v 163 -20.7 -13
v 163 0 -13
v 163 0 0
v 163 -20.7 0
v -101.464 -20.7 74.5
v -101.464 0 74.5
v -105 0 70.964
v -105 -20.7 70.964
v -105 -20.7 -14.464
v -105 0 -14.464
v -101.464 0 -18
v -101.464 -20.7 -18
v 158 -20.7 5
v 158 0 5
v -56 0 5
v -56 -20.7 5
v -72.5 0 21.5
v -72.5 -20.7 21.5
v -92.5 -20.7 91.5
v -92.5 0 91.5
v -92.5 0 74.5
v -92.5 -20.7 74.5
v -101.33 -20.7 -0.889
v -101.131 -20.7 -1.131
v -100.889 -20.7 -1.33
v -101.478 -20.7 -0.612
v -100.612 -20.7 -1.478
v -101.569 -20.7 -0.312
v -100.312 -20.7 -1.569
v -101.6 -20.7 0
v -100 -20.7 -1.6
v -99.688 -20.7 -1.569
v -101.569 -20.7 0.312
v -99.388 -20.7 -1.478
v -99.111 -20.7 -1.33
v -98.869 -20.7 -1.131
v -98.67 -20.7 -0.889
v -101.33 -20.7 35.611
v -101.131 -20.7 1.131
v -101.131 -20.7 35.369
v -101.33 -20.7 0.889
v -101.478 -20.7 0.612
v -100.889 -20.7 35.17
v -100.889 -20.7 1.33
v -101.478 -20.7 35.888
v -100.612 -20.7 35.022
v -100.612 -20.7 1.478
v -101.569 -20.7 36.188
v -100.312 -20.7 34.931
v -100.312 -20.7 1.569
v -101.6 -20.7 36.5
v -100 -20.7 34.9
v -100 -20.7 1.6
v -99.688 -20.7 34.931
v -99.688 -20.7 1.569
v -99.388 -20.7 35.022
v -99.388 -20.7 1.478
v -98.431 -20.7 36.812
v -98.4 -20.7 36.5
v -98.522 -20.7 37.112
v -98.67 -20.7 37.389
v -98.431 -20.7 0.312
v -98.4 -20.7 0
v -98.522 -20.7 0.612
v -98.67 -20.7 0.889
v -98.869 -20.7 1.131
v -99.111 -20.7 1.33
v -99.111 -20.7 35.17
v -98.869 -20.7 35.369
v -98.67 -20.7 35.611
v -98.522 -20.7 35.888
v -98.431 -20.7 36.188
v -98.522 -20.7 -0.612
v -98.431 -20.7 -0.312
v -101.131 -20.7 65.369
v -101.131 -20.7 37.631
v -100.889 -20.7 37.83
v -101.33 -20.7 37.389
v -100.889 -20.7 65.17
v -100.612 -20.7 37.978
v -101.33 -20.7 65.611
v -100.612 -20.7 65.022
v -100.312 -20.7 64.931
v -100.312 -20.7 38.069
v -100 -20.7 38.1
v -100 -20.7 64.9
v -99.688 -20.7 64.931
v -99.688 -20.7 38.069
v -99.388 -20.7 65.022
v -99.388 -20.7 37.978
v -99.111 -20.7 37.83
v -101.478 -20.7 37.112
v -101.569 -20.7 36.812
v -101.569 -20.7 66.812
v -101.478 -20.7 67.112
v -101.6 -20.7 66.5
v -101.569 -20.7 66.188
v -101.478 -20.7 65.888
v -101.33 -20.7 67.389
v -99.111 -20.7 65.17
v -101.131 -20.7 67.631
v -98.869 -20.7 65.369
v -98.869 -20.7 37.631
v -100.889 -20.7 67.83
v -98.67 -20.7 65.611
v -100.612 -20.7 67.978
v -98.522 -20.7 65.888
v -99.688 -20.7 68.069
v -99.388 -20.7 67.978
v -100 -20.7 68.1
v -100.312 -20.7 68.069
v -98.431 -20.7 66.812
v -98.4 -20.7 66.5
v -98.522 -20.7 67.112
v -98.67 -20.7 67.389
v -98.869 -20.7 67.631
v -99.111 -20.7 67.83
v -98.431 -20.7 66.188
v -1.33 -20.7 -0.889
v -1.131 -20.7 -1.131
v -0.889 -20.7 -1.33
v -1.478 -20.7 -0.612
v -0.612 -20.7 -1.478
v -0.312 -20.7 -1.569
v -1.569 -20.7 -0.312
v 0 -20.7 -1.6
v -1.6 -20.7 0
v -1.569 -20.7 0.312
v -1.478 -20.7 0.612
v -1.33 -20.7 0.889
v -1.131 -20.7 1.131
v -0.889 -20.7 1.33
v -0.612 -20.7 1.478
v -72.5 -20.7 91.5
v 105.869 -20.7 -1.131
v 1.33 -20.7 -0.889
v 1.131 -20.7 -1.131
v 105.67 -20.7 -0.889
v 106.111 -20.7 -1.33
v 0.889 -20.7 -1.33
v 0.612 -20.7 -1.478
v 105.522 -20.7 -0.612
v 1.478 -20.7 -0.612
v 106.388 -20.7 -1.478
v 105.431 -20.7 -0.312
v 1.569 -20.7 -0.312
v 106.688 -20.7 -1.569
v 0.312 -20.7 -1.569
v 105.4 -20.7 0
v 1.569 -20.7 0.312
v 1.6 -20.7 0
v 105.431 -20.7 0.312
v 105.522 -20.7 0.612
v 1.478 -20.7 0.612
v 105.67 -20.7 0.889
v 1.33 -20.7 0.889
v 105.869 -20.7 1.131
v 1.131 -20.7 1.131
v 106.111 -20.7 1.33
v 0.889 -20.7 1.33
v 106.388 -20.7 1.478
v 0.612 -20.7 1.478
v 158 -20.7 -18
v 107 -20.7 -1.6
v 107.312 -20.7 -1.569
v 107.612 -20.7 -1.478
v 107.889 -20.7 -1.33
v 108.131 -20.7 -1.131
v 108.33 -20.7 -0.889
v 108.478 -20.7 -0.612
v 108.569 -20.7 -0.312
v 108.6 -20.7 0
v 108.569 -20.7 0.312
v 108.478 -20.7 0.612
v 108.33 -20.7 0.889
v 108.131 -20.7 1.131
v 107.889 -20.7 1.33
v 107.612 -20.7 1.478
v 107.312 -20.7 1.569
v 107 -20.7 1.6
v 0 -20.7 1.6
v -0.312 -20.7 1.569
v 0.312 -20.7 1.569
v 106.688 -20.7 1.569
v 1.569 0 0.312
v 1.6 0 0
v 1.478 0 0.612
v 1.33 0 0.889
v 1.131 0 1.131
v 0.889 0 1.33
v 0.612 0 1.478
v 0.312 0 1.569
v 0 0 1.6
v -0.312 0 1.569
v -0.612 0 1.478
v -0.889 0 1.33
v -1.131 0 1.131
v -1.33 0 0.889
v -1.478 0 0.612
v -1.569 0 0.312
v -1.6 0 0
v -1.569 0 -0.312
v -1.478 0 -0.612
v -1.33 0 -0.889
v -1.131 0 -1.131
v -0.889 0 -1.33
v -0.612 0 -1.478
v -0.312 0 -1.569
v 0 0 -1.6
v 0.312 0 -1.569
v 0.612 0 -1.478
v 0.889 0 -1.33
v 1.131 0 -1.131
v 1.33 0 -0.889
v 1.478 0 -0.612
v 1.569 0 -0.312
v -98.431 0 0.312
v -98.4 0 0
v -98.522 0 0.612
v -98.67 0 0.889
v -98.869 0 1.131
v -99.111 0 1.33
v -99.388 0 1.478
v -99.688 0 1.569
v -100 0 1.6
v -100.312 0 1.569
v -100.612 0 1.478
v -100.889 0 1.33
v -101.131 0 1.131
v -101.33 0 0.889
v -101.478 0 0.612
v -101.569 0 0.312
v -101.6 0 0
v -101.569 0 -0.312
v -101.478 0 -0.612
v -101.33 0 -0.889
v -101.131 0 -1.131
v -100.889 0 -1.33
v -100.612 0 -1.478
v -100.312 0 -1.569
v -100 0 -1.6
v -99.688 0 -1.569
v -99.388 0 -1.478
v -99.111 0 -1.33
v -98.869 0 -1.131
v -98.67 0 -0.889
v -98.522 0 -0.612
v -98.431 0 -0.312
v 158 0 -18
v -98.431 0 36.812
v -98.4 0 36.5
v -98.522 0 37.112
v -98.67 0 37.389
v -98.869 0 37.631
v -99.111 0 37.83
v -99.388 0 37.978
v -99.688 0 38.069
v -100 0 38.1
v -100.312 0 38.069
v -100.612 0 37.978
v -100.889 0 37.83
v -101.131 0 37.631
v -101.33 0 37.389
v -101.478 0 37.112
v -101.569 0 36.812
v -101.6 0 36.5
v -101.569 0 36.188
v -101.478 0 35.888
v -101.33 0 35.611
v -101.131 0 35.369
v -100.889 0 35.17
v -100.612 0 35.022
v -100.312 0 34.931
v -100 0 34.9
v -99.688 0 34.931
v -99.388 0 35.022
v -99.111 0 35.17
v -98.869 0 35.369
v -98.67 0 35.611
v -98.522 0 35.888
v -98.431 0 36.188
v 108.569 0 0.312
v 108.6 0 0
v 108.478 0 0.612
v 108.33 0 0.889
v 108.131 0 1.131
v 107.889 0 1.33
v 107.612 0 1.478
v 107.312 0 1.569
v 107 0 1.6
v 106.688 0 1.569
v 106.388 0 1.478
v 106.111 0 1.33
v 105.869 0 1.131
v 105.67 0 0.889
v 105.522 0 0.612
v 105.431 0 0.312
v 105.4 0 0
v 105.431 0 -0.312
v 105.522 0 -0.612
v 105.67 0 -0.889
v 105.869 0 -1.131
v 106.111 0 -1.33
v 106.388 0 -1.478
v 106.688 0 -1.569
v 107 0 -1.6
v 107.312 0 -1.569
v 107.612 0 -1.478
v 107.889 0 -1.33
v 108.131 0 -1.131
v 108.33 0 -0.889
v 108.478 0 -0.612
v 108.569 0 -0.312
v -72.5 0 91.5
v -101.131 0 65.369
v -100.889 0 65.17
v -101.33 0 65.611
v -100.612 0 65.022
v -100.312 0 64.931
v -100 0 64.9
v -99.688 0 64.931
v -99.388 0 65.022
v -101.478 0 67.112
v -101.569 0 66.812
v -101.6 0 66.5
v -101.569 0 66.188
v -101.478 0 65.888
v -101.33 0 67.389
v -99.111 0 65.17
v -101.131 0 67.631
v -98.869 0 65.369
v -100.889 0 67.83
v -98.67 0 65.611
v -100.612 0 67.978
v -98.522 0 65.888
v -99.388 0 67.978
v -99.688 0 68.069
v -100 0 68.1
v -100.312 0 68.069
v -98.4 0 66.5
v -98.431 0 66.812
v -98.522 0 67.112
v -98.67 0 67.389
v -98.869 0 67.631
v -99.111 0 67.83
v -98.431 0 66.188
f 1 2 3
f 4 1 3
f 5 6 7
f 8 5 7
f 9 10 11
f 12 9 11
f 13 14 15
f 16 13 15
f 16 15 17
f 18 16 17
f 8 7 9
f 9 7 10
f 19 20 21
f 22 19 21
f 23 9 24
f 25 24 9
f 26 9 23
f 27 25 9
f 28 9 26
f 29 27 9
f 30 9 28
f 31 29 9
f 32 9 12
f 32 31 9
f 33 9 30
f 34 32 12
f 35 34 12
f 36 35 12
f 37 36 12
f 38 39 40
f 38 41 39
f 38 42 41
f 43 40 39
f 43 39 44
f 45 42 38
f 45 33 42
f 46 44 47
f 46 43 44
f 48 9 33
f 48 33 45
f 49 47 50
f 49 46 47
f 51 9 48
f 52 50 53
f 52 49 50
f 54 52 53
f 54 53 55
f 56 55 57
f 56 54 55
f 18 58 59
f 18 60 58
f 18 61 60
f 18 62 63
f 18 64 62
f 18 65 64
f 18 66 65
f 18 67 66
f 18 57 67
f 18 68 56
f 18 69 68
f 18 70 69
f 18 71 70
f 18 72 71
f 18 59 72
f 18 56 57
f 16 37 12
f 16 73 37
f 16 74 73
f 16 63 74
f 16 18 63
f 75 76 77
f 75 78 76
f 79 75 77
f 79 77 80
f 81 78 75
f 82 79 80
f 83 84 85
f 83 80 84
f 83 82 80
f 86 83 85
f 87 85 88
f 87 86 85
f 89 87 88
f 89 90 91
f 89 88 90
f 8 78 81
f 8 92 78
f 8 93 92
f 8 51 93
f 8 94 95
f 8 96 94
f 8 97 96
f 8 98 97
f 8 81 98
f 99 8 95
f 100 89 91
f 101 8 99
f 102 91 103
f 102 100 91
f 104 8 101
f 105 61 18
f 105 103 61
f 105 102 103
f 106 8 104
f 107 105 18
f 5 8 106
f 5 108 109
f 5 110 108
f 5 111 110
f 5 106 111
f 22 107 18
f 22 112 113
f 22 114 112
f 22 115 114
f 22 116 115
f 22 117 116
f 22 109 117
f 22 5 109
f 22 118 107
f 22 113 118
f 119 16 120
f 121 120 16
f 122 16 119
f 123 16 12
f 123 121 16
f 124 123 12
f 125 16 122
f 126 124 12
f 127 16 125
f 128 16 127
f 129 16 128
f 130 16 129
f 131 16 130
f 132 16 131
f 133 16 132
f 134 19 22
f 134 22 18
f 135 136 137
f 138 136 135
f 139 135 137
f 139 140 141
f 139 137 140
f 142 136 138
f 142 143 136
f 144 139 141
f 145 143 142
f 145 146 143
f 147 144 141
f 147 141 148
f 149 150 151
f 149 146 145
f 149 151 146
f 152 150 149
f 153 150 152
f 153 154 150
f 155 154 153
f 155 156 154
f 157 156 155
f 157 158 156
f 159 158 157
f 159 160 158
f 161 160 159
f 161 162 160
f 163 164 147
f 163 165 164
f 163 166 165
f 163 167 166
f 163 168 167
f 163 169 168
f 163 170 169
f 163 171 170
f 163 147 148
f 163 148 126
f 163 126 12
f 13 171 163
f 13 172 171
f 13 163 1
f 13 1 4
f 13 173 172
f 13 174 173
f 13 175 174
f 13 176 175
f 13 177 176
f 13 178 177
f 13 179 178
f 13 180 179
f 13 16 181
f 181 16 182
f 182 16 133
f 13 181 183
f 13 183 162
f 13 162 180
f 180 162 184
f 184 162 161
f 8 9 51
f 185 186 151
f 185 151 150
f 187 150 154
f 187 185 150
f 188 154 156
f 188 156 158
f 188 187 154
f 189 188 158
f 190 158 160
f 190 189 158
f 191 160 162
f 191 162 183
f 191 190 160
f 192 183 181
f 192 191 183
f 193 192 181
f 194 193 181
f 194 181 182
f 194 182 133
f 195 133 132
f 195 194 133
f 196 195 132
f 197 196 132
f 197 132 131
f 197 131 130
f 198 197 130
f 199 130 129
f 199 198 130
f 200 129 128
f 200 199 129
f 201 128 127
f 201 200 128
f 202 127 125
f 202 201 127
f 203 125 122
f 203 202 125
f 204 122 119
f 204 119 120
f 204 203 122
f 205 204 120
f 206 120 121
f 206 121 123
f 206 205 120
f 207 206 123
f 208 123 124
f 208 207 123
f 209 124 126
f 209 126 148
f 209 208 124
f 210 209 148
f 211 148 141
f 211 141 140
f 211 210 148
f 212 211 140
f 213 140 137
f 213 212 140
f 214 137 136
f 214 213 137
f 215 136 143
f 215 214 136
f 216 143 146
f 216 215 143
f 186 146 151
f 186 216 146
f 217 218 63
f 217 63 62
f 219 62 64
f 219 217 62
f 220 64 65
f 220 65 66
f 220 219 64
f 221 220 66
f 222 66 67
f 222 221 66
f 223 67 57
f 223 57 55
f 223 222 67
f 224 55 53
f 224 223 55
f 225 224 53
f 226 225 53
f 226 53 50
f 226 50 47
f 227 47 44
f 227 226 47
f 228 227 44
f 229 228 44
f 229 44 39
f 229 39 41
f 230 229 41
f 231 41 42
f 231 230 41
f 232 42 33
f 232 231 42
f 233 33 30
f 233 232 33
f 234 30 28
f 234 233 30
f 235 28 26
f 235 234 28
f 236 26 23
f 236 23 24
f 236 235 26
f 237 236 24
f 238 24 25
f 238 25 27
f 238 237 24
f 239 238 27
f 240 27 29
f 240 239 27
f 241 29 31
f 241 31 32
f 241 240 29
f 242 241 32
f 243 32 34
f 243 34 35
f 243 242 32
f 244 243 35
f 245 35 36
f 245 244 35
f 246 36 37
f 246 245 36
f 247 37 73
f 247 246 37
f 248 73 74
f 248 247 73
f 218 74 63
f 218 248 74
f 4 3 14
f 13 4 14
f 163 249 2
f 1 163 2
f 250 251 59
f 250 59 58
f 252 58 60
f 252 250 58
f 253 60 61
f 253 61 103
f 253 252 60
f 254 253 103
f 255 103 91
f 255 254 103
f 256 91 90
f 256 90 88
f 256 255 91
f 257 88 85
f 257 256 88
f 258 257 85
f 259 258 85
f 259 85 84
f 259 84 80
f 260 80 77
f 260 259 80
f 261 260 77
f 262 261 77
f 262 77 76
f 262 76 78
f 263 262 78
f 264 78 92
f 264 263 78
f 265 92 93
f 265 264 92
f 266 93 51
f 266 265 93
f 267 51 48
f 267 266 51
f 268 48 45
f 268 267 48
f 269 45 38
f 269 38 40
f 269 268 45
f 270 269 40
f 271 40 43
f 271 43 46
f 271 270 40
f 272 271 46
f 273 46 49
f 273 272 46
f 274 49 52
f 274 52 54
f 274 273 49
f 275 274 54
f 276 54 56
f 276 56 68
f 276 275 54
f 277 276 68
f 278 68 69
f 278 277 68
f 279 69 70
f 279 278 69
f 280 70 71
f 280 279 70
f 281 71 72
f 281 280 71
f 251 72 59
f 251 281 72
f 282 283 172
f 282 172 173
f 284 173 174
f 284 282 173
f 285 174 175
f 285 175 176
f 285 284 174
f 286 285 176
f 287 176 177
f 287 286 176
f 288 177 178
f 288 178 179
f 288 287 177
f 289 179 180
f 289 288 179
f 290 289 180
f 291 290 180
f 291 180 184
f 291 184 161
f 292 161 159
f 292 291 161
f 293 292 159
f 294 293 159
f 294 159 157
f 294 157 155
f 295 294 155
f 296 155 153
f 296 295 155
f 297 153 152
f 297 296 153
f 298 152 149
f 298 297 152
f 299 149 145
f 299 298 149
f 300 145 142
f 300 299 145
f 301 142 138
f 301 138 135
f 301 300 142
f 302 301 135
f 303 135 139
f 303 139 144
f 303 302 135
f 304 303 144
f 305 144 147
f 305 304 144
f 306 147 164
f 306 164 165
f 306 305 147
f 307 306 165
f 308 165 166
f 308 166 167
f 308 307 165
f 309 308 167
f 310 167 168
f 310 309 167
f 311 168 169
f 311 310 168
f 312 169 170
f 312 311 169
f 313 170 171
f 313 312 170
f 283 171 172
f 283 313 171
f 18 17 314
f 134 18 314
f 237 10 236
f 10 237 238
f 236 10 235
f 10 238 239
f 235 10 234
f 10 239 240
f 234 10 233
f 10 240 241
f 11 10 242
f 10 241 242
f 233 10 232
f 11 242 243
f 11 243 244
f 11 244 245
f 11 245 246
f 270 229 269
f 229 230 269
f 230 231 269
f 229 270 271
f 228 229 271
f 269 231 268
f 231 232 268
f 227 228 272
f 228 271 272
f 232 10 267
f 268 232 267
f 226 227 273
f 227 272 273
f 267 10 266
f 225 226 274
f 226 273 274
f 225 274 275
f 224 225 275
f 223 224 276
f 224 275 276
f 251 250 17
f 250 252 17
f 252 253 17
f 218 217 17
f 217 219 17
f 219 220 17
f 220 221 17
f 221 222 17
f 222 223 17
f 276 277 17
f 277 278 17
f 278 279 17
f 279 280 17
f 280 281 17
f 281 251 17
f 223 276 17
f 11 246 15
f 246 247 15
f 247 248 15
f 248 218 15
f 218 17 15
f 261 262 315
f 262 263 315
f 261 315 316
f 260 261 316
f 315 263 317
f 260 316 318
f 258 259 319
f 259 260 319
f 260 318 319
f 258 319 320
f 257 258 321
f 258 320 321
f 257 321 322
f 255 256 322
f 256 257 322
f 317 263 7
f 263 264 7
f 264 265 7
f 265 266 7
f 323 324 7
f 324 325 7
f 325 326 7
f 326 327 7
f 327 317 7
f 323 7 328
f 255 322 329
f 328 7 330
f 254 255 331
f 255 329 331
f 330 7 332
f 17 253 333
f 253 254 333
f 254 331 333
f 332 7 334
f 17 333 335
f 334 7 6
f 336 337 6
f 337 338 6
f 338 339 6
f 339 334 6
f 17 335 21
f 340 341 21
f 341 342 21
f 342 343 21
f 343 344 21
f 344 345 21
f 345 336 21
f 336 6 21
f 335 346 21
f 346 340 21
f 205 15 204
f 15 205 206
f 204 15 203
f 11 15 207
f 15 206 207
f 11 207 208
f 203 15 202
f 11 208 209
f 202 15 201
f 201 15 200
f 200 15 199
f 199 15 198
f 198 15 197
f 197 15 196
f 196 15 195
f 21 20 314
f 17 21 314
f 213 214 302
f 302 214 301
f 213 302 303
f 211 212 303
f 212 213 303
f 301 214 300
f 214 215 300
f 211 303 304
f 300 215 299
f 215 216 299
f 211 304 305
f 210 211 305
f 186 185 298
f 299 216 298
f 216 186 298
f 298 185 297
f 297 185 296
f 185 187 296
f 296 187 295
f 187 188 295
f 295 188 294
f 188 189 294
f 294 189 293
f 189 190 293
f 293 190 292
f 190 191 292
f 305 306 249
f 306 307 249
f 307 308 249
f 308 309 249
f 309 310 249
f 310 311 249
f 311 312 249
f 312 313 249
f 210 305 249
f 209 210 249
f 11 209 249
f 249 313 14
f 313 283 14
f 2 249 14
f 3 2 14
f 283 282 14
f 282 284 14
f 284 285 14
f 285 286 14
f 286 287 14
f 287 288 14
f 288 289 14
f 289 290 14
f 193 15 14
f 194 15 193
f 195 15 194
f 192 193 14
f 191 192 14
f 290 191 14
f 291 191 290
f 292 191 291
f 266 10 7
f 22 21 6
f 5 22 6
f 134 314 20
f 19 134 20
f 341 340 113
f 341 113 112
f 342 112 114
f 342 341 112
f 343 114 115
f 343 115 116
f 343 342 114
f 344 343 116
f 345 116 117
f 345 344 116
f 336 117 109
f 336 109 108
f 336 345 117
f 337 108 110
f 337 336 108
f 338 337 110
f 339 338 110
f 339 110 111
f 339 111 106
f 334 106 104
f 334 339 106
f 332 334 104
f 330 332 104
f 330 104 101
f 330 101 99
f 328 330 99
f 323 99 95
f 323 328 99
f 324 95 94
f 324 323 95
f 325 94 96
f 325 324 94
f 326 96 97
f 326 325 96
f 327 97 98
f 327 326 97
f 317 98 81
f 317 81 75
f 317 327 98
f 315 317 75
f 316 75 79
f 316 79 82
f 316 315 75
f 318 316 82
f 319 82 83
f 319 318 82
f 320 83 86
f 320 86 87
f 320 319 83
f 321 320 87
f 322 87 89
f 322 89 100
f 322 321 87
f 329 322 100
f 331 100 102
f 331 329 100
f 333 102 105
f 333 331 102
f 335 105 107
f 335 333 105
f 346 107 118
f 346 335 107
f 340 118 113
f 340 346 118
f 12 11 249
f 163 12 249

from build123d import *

# Parameters (mm, degrees)
F0_R     = 1.6
F1_DEPTH = 20.7


with BuildPart() as f1:
    # F0 (on Front) → F1 (new body)
    with BuildSketch(Plane.XZ):
        Polygon((163, 0), (158, 5), (158, -18), (163, -13), align=None)
        Polygon((158, -18), (158, 5), (-56, 5), (-72.5, 21.5), (-72.5, 91.5), (-92.5, 91.5), (-92.5, 74.5), (-101.464466, 74.5), (-105, 70.964466), (-105, -14.464466), (-101.464466, -18), align=None)
        with Locations((-100, 0)):
            Circle(F0_R, mode=Mode.SUBTRACT)
        Circle(F0_R, mode=Mode.SUBTRACT)
        with Locations((-100, 36.5)):
            Circle(F0_R, mode=Mode.SUBTRACT)
        with Locations((107, 0)):
            Circle(F0_R, mode=Mode.SUBTRACT)
        with Locations((-100, 66.5)):
            Circle(F0_R, mode=Mode.SUBTRACT)
    extrude(amount=F1_DEPTH)


solid = f1.part
